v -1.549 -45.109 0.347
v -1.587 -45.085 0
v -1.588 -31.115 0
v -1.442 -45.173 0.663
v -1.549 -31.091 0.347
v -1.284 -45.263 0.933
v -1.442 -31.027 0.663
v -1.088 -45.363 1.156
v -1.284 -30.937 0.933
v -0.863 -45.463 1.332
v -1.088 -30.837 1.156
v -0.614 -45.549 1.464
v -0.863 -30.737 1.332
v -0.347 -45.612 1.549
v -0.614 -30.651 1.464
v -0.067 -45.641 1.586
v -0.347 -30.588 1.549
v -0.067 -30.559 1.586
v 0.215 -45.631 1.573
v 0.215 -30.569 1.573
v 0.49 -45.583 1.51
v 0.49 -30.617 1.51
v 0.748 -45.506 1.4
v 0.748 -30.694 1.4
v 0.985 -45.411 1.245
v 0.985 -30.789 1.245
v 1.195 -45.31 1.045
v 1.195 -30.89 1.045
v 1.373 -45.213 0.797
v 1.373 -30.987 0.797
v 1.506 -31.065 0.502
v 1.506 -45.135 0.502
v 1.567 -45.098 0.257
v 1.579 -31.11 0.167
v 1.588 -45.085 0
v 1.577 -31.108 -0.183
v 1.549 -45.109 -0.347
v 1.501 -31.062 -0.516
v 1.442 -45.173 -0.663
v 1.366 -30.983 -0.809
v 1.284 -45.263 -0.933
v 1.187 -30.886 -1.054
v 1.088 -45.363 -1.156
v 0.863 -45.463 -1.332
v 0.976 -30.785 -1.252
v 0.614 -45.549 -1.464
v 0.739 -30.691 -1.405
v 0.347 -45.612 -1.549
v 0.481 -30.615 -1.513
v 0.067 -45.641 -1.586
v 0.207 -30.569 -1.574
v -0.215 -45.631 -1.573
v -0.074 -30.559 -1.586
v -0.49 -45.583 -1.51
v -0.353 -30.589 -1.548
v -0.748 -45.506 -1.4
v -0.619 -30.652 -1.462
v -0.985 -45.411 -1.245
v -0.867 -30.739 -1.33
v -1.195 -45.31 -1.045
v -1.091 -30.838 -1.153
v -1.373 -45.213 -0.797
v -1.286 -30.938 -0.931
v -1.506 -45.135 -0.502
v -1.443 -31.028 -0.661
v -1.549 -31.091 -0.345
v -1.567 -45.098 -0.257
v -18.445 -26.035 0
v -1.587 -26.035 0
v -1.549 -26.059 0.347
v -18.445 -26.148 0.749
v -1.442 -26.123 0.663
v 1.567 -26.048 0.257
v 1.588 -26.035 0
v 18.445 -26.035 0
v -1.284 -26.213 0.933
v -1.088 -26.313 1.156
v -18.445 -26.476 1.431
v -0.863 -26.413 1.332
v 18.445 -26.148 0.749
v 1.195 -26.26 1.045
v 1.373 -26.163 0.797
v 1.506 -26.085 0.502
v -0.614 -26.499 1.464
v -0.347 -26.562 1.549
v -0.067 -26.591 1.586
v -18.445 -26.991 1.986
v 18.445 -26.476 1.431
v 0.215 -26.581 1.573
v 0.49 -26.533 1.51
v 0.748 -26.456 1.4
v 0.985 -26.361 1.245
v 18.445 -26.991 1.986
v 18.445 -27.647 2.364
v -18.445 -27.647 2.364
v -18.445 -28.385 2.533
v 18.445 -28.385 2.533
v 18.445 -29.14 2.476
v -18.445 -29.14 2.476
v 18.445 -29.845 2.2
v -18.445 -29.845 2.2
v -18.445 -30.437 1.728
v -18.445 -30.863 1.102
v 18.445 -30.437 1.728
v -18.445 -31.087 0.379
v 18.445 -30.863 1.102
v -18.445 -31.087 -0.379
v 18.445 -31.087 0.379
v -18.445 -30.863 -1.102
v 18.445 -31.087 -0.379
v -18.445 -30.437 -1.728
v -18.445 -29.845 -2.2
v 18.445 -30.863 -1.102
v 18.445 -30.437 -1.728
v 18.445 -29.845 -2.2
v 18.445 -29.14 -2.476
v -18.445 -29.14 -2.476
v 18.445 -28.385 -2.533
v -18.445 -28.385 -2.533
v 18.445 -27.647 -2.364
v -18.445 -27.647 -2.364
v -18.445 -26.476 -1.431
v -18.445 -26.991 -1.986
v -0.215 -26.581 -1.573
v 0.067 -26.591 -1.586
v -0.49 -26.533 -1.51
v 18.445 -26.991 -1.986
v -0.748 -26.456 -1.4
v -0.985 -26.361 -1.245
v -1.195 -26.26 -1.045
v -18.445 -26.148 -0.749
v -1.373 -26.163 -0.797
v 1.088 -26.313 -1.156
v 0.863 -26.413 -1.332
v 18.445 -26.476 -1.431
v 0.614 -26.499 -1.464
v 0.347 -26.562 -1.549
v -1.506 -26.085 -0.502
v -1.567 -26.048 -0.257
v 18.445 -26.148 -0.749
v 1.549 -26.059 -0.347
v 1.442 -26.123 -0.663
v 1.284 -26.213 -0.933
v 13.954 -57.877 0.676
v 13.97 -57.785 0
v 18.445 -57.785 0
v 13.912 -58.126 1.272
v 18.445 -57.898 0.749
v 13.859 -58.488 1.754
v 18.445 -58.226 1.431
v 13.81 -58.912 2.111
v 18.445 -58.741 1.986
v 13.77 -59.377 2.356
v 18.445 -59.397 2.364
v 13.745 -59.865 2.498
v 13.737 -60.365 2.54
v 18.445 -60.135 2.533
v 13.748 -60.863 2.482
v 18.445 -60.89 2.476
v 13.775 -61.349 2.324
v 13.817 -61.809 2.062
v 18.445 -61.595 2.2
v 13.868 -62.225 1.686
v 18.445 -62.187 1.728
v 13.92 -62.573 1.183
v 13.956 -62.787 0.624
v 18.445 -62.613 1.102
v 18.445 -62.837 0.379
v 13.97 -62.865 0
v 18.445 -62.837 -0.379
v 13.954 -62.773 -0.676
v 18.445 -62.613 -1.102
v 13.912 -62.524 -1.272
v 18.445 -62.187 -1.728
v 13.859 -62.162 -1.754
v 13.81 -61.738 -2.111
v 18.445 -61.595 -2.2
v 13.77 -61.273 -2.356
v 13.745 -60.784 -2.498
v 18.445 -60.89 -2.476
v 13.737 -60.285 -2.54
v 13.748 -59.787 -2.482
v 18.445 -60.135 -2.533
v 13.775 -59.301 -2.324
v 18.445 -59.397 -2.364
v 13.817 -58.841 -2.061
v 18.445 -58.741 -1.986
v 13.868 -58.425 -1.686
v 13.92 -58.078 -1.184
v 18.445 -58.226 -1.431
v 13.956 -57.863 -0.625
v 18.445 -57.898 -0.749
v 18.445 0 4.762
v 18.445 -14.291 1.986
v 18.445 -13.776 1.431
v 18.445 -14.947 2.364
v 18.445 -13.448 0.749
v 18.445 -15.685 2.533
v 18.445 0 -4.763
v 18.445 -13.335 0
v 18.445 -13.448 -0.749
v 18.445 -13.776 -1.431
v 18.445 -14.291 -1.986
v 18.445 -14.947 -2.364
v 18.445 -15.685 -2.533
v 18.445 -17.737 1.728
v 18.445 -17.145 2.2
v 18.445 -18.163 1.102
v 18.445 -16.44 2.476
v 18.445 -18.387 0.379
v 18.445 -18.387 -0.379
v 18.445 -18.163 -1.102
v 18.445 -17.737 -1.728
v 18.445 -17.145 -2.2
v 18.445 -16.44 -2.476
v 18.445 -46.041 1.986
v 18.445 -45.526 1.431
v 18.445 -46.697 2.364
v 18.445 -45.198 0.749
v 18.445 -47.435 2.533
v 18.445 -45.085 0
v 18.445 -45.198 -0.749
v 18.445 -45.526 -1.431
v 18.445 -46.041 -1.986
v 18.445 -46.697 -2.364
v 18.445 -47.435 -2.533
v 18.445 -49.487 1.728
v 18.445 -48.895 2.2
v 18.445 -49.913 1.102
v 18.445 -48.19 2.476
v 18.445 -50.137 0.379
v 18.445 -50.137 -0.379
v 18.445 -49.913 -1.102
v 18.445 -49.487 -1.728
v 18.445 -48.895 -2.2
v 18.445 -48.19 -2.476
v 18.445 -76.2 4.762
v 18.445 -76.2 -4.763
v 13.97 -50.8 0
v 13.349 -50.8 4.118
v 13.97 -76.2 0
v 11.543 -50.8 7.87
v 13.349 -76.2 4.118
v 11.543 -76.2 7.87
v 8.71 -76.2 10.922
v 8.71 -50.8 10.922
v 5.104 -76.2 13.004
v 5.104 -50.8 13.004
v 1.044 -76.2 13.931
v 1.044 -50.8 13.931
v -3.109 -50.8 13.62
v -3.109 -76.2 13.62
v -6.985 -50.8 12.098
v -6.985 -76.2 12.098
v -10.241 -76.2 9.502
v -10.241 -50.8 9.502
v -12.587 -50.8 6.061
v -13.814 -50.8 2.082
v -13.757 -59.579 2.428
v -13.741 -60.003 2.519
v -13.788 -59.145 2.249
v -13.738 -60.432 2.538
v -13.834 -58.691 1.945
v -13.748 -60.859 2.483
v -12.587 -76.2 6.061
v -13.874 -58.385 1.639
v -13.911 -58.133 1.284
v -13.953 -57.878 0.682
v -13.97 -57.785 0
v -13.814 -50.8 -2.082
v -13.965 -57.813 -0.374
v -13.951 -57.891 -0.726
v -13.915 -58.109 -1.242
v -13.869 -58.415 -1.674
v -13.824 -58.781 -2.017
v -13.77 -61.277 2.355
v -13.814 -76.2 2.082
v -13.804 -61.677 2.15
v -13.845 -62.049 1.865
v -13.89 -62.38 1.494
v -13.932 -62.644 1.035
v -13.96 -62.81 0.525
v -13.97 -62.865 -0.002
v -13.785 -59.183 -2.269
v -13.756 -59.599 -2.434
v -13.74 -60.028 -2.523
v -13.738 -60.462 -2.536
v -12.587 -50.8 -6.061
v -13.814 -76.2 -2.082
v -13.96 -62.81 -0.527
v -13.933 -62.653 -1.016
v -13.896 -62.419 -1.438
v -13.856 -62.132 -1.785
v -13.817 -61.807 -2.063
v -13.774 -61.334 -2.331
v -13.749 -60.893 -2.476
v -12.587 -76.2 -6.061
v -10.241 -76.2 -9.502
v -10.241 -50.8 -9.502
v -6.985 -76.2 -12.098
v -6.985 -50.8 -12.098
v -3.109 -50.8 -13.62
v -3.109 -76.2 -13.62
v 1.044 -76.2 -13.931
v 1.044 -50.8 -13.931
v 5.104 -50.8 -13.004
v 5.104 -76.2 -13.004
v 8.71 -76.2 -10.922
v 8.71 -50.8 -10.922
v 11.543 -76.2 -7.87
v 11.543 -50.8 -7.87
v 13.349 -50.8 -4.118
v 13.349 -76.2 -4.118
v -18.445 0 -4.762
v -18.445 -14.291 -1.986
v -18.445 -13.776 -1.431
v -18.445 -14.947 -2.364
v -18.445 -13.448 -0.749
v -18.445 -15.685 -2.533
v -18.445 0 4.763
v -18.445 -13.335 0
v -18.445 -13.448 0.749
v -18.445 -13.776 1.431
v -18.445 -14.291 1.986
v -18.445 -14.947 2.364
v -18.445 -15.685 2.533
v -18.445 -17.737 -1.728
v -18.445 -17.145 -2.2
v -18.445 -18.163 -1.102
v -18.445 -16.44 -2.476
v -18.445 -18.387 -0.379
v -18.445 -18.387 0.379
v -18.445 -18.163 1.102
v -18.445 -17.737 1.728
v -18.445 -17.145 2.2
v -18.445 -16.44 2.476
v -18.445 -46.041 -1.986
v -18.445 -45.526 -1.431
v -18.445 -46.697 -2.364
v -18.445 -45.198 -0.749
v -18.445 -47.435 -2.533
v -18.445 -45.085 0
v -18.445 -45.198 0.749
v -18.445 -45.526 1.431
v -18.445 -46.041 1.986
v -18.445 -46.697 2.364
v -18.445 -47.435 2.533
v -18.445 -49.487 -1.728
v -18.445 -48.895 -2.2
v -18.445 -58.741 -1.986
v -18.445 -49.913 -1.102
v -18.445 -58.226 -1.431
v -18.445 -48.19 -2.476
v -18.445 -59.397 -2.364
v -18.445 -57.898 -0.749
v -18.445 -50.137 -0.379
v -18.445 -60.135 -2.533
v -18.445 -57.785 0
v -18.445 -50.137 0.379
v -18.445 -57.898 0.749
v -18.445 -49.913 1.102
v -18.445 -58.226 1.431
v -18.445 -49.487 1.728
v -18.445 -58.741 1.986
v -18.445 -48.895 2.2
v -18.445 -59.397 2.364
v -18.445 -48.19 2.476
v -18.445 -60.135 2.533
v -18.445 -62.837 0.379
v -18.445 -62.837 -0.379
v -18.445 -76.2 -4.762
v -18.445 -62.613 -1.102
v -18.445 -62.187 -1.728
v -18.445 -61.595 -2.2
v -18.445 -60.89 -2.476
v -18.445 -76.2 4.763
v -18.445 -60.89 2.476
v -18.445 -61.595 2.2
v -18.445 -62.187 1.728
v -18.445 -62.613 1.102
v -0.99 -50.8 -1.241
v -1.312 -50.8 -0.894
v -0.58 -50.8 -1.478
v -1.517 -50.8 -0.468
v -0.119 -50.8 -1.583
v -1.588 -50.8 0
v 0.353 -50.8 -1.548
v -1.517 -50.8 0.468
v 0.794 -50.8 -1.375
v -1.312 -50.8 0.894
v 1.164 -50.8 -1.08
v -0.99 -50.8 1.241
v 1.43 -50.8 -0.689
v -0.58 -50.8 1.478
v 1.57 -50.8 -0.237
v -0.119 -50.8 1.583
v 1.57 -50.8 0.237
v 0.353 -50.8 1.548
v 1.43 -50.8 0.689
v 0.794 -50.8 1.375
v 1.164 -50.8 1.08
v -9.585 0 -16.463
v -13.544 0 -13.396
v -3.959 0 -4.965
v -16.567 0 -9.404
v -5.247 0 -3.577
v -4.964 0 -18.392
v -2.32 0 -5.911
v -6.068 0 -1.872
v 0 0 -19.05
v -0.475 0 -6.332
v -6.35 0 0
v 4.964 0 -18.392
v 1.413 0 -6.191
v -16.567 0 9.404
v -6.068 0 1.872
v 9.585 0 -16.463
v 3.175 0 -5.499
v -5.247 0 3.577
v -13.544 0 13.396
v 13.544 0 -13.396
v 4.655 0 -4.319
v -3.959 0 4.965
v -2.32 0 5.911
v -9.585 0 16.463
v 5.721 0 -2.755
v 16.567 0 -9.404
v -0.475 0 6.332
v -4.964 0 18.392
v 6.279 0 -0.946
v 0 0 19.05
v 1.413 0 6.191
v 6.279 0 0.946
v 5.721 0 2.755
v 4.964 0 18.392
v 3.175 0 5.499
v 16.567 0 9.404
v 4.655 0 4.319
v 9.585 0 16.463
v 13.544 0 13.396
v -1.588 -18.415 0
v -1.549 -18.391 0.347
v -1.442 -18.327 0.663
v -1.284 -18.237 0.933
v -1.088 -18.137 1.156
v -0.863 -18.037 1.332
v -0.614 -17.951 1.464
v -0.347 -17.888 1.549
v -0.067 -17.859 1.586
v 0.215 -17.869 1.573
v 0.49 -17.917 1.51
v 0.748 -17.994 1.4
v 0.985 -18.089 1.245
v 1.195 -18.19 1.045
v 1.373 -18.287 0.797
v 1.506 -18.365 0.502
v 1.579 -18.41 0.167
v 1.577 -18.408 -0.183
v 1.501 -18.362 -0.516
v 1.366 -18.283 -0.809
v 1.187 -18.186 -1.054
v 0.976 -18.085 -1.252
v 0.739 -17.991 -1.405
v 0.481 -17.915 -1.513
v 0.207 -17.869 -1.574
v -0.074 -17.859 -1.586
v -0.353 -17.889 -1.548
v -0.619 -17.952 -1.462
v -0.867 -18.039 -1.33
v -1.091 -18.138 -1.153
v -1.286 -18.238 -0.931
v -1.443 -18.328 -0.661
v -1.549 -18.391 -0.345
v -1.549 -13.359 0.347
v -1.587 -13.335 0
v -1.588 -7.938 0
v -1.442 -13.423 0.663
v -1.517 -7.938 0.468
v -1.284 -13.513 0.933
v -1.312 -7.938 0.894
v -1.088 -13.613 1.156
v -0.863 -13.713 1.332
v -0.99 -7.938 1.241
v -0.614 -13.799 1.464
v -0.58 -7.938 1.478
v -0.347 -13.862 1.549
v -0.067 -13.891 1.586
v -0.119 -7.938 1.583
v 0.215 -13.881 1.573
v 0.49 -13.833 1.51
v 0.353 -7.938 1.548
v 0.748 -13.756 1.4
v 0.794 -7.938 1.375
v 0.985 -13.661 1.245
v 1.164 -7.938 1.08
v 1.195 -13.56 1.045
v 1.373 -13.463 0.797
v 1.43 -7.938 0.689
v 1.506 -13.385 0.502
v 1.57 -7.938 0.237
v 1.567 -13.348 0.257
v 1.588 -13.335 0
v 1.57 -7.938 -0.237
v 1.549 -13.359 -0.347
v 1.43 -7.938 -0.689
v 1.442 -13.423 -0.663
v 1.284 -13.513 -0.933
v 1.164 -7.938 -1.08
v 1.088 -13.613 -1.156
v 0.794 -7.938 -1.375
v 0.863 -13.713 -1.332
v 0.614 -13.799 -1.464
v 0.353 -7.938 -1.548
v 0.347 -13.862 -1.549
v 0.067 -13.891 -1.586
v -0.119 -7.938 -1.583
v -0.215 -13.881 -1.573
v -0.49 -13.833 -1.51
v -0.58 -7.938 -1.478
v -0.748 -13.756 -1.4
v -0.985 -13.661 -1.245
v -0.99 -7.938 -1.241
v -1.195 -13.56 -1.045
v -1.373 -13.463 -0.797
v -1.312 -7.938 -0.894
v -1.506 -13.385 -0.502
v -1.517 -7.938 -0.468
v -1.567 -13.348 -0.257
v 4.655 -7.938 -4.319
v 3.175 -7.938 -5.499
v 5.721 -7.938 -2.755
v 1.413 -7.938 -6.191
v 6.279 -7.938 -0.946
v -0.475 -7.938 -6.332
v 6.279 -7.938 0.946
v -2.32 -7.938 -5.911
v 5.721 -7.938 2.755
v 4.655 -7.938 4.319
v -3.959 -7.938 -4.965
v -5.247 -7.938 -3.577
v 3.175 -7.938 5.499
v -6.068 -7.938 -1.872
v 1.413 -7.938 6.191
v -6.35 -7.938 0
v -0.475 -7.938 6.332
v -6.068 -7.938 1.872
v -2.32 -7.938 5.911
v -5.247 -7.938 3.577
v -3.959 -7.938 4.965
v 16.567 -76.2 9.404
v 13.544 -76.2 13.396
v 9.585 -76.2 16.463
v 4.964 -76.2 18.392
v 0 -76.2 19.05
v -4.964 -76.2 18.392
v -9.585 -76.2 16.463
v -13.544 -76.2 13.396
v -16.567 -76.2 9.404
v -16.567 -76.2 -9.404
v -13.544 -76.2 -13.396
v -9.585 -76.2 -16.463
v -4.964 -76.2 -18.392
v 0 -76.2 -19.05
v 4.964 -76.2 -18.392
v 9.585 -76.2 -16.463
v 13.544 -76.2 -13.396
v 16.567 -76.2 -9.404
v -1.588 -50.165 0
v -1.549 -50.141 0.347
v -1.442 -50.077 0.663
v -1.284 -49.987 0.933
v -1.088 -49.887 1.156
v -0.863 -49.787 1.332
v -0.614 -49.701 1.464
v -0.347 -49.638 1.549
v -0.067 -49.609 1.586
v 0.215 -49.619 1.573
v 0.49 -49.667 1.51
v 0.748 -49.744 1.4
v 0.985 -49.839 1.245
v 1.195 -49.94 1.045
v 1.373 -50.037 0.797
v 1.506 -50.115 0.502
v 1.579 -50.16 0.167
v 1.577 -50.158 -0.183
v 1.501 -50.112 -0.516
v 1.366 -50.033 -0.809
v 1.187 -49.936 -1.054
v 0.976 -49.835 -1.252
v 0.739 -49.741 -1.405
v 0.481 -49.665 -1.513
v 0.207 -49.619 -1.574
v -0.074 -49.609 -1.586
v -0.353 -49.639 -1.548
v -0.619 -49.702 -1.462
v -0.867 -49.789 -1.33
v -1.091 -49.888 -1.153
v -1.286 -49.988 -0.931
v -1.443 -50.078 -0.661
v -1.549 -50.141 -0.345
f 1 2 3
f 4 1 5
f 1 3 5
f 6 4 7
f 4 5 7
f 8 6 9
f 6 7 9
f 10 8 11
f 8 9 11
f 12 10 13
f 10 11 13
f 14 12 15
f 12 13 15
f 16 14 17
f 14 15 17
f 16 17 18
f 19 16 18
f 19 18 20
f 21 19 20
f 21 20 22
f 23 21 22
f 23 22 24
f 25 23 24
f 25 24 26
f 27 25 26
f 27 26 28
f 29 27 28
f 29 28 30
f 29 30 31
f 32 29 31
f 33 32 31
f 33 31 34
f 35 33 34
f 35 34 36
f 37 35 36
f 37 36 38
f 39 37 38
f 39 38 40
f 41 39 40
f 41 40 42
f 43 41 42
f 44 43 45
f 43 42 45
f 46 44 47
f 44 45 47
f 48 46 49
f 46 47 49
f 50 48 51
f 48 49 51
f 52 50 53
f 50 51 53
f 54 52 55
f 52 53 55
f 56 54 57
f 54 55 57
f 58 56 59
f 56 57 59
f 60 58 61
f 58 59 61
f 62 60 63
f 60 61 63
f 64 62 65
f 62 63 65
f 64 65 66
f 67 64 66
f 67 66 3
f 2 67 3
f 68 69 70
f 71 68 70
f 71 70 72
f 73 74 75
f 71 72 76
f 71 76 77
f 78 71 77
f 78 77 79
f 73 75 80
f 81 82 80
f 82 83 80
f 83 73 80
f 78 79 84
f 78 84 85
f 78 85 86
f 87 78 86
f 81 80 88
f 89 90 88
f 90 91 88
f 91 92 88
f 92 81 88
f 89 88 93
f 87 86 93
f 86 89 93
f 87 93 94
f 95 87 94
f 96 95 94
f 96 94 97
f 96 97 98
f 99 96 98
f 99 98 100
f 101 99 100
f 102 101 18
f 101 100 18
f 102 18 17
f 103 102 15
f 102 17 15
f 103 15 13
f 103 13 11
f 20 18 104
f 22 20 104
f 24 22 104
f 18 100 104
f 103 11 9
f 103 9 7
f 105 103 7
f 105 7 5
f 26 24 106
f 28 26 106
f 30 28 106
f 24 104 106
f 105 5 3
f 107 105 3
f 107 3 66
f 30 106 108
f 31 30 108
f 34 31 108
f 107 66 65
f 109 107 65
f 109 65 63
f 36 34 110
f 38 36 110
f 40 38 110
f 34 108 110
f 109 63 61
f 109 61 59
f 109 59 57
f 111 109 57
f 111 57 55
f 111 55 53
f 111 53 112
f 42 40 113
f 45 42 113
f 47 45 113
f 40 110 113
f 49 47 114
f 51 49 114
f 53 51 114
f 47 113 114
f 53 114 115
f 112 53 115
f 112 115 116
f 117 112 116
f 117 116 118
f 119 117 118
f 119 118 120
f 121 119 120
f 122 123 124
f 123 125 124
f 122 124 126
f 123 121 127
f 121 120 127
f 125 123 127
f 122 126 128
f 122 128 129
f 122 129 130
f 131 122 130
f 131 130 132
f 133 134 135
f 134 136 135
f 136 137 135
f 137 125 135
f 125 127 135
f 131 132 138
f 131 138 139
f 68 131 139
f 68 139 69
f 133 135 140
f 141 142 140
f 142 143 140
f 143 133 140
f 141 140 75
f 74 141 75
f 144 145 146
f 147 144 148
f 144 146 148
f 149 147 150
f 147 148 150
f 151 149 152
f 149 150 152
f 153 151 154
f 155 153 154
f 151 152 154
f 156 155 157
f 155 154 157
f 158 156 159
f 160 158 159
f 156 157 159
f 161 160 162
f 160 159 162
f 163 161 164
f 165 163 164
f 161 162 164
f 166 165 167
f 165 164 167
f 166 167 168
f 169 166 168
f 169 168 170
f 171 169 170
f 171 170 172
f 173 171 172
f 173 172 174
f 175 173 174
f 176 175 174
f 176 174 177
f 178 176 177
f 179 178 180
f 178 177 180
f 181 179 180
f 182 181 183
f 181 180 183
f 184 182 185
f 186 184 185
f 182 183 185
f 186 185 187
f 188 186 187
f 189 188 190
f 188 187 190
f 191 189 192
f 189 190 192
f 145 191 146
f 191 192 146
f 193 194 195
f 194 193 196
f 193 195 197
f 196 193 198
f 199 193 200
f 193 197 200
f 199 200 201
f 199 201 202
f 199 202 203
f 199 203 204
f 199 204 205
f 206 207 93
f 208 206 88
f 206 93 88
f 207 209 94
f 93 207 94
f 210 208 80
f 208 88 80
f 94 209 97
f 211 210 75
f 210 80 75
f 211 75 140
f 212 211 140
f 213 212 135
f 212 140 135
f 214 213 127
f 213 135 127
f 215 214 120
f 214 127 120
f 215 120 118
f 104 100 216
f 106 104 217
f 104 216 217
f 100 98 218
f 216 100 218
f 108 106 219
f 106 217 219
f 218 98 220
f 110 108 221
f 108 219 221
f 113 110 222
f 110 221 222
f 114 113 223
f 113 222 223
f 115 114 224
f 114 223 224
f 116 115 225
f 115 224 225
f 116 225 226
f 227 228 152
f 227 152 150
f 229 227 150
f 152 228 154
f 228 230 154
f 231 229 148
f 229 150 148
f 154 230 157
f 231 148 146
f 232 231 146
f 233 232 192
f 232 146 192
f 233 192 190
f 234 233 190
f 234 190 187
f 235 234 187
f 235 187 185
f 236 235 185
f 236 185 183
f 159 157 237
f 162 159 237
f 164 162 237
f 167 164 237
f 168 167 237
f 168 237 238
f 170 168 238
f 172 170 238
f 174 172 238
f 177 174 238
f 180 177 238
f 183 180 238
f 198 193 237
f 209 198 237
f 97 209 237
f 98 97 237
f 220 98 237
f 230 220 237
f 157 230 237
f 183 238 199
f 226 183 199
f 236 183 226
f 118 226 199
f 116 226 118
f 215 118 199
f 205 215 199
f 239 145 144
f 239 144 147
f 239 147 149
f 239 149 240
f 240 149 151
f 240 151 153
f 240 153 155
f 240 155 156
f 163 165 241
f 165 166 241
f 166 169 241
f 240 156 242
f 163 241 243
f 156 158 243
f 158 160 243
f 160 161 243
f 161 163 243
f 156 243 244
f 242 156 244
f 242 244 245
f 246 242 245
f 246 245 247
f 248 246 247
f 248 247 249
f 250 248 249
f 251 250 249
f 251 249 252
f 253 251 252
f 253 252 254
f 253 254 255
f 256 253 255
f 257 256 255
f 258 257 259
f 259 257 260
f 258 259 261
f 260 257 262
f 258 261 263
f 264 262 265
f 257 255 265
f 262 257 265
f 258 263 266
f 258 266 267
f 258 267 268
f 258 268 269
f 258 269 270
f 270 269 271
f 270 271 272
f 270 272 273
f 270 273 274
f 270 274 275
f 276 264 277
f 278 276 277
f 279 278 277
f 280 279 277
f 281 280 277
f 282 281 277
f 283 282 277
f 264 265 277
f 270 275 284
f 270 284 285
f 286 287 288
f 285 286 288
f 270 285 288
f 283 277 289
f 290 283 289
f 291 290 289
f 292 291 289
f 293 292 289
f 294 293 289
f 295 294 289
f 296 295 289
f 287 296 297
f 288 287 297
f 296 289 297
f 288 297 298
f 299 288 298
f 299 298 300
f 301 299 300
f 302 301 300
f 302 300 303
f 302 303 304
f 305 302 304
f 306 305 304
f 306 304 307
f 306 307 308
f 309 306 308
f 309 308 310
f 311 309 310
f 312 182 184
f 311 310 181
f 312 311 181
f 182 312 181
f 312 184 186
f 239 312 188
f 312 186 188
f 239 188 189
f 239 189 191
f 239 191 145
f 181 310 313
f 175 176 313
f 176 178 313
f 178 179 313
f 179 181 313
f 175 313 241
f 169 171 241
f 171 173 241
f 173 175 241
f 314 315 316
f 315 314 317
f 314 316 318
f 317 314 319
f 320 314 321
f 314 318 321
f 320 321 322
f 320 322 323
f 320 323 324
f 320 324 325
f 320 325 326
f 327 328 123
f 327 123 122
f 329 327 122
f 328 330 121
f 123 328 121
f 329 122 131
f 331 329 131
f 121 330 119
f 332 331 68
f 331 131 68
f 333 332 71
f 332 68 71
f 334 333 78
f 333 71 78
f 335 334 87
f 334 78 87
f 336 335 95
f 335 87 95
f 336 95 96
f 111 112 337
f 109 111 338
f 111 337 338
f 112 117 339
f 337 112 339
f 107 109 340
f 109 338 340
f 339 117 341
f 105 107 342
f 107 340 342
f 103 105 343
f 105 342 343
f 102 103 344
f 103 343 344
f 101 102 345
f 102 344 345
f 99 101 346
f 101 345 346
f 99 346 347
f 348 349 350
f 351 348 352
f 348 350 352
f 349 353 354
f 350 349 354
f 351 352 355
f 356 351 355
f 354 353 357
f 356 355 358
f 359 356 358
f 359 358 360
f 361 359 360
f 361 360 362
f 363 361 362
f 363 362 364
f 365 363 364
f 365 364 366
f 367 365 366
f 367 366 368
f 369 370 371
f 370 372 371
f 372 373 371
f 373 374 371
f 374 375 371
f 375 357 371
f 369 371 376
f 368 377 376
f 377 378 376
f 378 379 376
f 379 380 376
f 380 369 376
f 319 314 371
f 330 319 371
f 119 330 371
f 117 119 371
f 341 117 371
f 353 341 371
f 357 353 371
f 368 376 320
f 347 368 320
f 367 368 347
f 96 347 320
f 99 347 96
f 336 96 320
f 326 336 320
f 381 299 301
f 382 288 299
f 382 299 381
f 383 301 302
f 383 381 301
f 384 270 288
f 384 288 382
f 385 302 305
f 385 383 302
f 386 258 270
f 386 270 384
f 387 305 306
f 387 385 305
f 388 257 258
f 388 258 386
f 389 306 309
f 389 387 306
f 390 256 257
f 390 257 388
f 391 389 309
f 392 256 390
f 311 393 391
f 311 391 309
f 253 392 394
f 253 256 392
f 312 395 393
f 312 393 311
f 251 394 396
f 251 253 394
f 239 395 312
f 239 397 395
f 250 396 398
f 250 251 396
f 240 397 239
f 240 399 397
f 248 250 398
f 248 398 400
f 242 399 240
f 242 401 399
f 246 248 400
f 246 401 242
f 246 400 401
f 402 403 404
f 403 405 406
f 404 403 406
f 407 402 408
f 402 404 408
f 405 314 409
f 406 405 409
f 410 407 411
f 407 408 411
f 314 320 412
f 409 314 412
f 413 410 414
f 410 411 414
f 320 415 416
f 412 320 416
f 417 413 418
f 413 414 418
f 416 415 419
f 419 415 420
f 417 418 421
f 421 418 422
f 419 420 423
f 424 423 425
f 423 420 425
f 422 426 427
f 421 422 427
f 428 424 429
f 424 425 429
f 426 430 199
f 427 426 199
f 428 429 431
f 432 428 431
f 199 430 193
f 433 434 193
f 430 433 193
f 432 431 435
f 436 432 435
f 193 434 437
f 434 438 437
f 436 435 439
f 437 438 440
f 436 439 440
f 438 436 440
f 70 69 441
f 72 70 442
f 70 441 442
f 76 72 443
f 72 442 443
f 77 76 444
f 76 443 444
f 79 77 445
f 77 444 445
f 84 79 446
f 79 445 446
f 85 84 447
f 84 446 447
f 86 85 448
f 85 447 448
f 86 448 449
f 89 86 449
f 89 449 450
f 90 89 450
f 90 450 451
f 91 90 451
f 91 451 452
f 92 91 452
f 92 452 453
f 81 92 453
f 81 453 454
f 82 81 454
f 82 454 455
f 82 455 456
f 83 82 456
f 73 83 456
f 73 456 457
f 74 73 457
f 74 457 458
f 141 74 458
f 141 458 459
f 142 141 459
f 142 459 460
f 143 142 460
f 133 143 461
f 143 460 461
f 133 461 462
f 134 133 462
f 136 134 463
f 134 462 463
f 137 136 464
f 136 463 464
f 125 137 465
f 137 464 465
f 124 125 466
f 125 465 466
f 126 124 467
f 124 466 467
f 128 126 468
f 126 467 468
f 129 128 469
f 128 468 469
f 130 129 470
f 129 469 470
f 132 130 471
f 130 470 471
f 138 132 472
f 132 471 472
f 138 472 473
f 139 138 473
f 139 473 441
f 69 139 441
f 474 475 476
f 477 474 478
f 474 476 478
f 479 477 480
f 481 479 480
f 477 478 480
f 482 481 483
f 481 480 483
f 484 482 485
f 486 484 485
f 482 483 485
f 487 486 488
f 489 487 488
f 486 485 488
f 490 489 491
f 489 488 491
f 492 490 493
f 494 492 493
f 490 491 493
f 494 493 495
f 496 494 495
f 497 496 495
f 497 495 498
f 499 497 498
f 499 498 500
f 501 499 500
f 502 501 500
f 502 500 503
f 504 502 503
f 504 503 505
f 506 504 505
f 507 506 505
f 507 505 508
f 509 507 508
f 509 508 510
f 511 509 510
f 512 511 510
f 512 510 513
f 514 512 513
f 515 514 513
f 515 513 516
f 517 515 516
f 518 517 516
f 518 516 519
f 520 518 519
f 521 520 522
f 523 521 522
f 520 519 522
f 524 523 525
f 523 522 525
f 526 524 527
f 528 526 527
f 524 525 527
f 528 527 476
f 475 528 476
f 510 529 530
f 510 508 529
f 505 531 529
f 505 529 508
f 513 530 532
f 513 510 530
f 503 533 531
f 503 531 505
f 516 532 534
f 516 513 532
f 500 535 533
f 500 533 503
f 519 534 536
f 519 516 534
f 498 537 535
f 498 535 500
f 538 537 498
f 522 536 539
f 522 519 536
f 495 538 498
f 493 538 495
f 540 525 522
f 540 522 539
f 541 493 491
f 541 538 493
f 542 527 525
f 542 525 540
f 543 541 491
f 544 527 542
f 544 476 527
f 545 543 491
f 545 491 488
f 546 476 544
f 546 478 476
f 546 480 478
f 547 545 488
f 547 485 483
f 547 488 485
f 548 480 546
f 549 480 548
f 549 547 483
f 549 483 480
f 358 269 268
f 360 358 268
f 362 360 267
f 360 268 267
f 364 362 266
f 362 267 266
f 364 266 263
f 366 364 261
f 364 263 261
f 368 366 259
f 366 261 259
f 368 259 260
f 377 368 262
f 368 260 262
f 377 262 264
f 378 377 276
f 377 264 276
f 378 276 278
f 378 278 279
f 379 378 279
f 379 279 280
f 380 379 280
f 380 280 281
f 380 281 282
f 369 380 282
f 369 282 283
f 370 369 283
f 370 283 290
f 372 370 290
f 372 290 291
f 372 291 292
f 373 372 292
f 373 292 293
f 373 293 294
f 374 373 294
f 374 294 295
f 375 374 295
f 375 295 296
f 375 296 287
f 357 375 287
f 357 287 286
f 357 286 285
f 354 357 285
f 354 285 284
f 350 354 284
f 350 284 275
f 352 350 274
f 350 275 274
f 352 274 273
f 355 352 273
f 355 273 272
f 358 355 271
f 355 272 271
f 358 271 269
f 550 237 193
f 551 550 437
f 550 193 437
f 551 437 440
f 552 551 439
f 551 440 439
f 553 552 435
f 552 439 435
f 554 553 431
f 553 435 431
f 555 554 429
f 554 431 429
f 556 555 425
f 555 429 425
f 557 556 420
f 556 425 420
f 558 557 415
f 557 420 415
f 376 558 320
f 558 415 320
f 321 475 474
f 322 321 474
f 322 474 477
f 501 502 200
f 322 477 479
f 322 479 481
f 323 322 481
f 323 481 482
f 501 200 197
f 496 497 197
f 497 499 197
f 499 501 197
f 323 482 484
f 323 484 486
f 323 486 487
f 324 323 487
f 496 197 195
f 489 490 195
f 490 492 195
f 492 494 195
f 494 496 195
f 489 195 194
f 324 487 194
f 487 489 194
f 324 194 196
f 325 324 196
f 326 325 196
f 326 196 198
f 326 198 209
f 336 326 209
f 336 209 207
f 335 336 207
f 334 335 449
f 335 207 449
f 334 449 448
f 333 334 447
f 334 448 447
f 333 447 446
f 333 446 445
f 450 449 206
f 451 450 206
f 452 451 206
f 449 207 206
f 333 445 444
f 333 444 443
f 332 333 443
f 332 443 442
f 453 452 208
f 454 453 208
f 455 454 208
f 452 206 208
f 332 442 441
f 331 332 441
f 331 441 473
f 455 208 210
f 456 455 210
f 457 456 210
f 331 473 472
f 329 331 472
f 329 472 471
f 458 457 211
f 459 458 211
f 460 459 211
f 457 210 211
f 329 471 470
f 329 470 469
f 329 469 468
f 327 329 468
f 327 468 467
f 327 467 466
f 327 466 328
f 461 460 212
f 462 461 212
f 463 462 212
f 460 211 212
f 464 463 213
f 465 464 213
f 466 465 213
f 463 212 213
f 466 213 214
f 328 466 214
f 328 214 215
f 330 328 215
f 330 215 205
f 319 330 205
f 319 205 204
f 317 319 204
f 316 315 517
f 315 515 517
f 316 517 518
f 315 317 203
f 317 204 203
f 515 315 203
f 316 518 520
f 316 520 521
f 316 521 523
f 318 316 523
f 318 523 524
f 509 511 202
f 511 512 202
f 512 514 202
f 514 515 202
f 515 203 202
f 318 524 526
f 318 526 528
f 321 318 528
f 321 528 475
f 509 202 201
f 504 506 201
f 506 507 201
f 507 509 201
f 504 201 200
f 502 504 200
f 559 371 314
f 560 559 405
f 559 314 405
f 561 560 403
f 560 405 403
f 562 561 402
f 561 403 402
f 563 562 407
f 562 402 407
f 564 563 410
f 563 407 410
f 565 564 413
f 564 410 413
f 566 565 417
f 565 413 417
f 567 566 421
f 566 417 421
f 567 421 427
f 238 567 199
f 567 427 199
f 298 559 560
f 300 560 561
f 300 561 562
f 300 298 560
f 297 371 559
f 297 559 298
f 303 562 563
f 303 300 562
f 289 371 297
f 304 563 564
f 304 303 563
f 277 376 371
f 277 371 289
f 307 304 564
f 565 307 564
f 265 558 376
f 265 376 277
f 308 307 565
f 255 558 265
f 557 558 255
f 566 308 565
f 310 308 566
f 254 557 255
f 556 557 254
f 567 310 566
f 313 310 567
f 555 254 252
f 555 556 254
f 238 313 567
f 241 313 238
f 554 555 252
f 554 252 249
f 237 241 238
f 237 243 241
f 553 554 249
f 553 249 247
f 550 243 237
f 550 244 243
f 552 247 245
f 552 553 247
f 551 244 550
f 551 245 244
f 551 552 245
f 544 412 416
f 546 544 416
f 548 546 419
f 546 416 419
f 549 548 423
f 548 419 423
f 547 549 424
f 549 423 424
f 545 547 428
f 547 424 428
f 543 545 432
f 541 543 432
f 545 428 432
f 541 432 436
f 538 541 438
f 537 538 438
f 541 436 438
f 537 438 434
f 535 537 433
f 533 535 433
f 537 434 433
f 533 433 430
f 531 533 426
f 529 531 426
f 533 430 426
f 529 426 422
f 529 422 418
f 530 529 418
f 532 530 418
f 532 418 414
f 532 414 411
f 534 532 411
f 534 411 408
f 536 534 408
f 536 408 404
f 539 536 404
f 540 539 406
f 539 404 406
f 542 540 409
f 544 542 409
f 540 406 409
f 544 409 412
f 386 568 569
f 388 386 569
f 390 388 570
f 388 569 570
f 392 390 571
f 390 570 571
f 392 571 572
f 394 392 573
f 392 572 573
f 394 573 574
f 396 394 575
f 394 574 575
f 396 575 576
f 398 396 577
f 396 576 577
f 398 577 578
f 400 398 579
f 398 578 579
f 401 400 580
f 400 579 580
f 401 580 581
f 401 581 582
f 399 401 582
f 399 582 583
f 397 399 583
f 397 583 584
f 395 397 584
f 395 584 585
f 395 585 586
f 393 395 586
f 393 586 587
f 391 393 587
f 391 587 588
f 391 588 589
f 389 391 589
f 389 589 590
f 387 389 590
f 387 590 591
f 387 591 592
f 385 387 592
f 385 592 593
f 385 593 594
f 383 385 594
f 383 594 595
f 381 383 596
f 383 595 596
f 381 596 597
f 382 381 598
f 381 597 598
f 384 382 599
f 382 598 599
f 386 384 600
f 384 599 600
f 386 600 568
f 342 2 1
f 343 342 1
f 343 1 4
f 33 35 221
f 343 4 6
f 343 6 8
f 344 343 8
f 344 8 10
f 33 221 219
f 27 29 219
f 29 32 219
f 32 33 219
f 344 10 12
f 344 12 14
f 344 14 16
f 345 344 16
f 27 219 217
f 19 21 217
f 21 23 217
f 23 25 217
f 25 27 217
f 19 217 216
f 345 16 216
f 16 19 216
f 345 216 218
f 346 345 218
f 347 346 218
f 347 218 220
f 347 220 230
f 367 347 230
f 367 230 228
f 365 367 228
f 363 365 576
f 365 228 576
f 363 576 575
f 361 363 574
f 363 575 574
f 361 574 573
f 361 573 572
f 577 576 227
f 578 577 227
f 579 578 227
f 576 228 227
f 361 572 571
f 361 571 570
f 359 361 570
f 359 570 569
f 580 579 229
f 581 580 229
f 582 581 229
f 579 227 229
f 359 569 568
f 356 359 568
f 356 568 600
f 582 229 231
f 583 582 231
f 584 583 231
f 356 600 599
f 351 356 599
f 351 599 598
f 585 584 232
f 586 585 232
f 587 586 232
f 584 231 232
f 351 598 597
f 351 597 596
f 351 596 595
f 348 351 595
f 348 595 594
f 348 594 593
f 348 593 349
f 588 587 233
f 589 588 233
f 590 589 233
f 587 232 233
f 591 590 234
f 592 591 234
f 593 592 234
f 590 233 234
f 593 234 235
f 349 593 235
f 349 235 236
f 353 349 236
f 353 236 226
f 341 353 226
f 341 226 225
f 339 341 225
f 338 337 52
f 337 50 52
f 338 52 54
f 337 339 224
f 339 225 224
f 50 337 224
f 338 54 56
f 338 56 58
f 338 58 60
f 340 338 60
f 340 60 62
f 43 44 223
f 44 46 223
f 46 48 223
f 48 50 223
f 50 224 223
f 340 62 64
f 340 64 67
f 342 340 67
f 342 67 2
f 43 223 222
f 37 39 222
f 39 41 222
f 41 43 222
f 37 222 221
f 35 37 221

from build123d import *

# Parameters (mm, degrees)
F0_R      = 19.05
F1_DEPTH  = 76.2
F2_R      = 13.97
F3_DEPTH  = 25.4
F5_DEPTH  = 76.201
F6_R      = 2.54
F7_DEPTH  = 36.8911684564
F8_R      = 6.35
F9_DEPTH  = 7.9375
F10_R     = 1.5875
F11_DEPTH = 68.2635001


with BuildPart() as f1:
    # F0 (on Front) → F1 (new body)
    with BuildSketch(Plane.XZ):
        Circle(F0_R)
    extrude(amount=F1_DEPTH)

    # F2 (on face) → F3 (cut)
    with BuildSketch(Plane.XZ.offset(76.2)):
        Circle(F2_R)
    extrude(amount=-F3_DEPTH, mode=Mode.SUBTRACT)

    # F4 (on face) → F5 (cut, through all)
    with BuildSketch(Plane.XZ.offset(76.2)):
        with BuildLine():
            ThreePointArc((18.4450827696, -4.7625016141), (19.05, -1.667e-06), (18.4450836031, 4.7624983859))
            Line((18.4450836031, 4.7624983859), (18.4450827696, -4.7625016141))
        make_face()
        with BuildLine():
            Line((-18.4450836031, -4.7624983859), (-18.4450827696, 4.7625016141))
            ThreePointArc((-18.4450827696, 4.7625016141), (-19.05, 1.667e-06), (-18.4450836031, -4.7624983859))
        make_face()
    extrude(amount=-F5_DEPTH, mode=Mode.SUBTRACT)

    # F6 (on face) → F7 (cut, through all)
    with BuildSketch(Plane(origin=(18.4450831863, 0, -1.6141e-06), x_dir=(0, 1, 0), z_dir=(1, 0, -8.75e-08))):
        with Locations((-60.325, 0)):
            Circle(F6_R)
        with Locations((-47.625, 0)):
            Circle(F6_R)
        with Locations((-28.575, 0)):
            Circle(F6_R)
        with Locations((-15.875, 0)):
            Circle(F6_R)
    extrude(amount=-F7_DEPTH, mode=Mode.SUBTRACT)

    # F8 (on face) → F9 (cut)
    with BuildSketch(Plane(origin=(0, 0, 0), x_dir=(-1, 0, 0), z_dir=(0, 1, 0))):
        Circle(F8_R)
    extrude(amount=-F9_DEPTH, mode=Mode.SUBTRACT)

    # F10 (on face) → F11 (cut, through all)
    with BuildSketch(Plane(origin=(0, -7.9375, 0), x_dir=(-1, 0, 0), z_dir=(0, 1, 0))):
        Circle(F10_R)
    extrude(amount=-F11_DEPTH, mode=Mode.SUBTRACT)


solid = f1.part
